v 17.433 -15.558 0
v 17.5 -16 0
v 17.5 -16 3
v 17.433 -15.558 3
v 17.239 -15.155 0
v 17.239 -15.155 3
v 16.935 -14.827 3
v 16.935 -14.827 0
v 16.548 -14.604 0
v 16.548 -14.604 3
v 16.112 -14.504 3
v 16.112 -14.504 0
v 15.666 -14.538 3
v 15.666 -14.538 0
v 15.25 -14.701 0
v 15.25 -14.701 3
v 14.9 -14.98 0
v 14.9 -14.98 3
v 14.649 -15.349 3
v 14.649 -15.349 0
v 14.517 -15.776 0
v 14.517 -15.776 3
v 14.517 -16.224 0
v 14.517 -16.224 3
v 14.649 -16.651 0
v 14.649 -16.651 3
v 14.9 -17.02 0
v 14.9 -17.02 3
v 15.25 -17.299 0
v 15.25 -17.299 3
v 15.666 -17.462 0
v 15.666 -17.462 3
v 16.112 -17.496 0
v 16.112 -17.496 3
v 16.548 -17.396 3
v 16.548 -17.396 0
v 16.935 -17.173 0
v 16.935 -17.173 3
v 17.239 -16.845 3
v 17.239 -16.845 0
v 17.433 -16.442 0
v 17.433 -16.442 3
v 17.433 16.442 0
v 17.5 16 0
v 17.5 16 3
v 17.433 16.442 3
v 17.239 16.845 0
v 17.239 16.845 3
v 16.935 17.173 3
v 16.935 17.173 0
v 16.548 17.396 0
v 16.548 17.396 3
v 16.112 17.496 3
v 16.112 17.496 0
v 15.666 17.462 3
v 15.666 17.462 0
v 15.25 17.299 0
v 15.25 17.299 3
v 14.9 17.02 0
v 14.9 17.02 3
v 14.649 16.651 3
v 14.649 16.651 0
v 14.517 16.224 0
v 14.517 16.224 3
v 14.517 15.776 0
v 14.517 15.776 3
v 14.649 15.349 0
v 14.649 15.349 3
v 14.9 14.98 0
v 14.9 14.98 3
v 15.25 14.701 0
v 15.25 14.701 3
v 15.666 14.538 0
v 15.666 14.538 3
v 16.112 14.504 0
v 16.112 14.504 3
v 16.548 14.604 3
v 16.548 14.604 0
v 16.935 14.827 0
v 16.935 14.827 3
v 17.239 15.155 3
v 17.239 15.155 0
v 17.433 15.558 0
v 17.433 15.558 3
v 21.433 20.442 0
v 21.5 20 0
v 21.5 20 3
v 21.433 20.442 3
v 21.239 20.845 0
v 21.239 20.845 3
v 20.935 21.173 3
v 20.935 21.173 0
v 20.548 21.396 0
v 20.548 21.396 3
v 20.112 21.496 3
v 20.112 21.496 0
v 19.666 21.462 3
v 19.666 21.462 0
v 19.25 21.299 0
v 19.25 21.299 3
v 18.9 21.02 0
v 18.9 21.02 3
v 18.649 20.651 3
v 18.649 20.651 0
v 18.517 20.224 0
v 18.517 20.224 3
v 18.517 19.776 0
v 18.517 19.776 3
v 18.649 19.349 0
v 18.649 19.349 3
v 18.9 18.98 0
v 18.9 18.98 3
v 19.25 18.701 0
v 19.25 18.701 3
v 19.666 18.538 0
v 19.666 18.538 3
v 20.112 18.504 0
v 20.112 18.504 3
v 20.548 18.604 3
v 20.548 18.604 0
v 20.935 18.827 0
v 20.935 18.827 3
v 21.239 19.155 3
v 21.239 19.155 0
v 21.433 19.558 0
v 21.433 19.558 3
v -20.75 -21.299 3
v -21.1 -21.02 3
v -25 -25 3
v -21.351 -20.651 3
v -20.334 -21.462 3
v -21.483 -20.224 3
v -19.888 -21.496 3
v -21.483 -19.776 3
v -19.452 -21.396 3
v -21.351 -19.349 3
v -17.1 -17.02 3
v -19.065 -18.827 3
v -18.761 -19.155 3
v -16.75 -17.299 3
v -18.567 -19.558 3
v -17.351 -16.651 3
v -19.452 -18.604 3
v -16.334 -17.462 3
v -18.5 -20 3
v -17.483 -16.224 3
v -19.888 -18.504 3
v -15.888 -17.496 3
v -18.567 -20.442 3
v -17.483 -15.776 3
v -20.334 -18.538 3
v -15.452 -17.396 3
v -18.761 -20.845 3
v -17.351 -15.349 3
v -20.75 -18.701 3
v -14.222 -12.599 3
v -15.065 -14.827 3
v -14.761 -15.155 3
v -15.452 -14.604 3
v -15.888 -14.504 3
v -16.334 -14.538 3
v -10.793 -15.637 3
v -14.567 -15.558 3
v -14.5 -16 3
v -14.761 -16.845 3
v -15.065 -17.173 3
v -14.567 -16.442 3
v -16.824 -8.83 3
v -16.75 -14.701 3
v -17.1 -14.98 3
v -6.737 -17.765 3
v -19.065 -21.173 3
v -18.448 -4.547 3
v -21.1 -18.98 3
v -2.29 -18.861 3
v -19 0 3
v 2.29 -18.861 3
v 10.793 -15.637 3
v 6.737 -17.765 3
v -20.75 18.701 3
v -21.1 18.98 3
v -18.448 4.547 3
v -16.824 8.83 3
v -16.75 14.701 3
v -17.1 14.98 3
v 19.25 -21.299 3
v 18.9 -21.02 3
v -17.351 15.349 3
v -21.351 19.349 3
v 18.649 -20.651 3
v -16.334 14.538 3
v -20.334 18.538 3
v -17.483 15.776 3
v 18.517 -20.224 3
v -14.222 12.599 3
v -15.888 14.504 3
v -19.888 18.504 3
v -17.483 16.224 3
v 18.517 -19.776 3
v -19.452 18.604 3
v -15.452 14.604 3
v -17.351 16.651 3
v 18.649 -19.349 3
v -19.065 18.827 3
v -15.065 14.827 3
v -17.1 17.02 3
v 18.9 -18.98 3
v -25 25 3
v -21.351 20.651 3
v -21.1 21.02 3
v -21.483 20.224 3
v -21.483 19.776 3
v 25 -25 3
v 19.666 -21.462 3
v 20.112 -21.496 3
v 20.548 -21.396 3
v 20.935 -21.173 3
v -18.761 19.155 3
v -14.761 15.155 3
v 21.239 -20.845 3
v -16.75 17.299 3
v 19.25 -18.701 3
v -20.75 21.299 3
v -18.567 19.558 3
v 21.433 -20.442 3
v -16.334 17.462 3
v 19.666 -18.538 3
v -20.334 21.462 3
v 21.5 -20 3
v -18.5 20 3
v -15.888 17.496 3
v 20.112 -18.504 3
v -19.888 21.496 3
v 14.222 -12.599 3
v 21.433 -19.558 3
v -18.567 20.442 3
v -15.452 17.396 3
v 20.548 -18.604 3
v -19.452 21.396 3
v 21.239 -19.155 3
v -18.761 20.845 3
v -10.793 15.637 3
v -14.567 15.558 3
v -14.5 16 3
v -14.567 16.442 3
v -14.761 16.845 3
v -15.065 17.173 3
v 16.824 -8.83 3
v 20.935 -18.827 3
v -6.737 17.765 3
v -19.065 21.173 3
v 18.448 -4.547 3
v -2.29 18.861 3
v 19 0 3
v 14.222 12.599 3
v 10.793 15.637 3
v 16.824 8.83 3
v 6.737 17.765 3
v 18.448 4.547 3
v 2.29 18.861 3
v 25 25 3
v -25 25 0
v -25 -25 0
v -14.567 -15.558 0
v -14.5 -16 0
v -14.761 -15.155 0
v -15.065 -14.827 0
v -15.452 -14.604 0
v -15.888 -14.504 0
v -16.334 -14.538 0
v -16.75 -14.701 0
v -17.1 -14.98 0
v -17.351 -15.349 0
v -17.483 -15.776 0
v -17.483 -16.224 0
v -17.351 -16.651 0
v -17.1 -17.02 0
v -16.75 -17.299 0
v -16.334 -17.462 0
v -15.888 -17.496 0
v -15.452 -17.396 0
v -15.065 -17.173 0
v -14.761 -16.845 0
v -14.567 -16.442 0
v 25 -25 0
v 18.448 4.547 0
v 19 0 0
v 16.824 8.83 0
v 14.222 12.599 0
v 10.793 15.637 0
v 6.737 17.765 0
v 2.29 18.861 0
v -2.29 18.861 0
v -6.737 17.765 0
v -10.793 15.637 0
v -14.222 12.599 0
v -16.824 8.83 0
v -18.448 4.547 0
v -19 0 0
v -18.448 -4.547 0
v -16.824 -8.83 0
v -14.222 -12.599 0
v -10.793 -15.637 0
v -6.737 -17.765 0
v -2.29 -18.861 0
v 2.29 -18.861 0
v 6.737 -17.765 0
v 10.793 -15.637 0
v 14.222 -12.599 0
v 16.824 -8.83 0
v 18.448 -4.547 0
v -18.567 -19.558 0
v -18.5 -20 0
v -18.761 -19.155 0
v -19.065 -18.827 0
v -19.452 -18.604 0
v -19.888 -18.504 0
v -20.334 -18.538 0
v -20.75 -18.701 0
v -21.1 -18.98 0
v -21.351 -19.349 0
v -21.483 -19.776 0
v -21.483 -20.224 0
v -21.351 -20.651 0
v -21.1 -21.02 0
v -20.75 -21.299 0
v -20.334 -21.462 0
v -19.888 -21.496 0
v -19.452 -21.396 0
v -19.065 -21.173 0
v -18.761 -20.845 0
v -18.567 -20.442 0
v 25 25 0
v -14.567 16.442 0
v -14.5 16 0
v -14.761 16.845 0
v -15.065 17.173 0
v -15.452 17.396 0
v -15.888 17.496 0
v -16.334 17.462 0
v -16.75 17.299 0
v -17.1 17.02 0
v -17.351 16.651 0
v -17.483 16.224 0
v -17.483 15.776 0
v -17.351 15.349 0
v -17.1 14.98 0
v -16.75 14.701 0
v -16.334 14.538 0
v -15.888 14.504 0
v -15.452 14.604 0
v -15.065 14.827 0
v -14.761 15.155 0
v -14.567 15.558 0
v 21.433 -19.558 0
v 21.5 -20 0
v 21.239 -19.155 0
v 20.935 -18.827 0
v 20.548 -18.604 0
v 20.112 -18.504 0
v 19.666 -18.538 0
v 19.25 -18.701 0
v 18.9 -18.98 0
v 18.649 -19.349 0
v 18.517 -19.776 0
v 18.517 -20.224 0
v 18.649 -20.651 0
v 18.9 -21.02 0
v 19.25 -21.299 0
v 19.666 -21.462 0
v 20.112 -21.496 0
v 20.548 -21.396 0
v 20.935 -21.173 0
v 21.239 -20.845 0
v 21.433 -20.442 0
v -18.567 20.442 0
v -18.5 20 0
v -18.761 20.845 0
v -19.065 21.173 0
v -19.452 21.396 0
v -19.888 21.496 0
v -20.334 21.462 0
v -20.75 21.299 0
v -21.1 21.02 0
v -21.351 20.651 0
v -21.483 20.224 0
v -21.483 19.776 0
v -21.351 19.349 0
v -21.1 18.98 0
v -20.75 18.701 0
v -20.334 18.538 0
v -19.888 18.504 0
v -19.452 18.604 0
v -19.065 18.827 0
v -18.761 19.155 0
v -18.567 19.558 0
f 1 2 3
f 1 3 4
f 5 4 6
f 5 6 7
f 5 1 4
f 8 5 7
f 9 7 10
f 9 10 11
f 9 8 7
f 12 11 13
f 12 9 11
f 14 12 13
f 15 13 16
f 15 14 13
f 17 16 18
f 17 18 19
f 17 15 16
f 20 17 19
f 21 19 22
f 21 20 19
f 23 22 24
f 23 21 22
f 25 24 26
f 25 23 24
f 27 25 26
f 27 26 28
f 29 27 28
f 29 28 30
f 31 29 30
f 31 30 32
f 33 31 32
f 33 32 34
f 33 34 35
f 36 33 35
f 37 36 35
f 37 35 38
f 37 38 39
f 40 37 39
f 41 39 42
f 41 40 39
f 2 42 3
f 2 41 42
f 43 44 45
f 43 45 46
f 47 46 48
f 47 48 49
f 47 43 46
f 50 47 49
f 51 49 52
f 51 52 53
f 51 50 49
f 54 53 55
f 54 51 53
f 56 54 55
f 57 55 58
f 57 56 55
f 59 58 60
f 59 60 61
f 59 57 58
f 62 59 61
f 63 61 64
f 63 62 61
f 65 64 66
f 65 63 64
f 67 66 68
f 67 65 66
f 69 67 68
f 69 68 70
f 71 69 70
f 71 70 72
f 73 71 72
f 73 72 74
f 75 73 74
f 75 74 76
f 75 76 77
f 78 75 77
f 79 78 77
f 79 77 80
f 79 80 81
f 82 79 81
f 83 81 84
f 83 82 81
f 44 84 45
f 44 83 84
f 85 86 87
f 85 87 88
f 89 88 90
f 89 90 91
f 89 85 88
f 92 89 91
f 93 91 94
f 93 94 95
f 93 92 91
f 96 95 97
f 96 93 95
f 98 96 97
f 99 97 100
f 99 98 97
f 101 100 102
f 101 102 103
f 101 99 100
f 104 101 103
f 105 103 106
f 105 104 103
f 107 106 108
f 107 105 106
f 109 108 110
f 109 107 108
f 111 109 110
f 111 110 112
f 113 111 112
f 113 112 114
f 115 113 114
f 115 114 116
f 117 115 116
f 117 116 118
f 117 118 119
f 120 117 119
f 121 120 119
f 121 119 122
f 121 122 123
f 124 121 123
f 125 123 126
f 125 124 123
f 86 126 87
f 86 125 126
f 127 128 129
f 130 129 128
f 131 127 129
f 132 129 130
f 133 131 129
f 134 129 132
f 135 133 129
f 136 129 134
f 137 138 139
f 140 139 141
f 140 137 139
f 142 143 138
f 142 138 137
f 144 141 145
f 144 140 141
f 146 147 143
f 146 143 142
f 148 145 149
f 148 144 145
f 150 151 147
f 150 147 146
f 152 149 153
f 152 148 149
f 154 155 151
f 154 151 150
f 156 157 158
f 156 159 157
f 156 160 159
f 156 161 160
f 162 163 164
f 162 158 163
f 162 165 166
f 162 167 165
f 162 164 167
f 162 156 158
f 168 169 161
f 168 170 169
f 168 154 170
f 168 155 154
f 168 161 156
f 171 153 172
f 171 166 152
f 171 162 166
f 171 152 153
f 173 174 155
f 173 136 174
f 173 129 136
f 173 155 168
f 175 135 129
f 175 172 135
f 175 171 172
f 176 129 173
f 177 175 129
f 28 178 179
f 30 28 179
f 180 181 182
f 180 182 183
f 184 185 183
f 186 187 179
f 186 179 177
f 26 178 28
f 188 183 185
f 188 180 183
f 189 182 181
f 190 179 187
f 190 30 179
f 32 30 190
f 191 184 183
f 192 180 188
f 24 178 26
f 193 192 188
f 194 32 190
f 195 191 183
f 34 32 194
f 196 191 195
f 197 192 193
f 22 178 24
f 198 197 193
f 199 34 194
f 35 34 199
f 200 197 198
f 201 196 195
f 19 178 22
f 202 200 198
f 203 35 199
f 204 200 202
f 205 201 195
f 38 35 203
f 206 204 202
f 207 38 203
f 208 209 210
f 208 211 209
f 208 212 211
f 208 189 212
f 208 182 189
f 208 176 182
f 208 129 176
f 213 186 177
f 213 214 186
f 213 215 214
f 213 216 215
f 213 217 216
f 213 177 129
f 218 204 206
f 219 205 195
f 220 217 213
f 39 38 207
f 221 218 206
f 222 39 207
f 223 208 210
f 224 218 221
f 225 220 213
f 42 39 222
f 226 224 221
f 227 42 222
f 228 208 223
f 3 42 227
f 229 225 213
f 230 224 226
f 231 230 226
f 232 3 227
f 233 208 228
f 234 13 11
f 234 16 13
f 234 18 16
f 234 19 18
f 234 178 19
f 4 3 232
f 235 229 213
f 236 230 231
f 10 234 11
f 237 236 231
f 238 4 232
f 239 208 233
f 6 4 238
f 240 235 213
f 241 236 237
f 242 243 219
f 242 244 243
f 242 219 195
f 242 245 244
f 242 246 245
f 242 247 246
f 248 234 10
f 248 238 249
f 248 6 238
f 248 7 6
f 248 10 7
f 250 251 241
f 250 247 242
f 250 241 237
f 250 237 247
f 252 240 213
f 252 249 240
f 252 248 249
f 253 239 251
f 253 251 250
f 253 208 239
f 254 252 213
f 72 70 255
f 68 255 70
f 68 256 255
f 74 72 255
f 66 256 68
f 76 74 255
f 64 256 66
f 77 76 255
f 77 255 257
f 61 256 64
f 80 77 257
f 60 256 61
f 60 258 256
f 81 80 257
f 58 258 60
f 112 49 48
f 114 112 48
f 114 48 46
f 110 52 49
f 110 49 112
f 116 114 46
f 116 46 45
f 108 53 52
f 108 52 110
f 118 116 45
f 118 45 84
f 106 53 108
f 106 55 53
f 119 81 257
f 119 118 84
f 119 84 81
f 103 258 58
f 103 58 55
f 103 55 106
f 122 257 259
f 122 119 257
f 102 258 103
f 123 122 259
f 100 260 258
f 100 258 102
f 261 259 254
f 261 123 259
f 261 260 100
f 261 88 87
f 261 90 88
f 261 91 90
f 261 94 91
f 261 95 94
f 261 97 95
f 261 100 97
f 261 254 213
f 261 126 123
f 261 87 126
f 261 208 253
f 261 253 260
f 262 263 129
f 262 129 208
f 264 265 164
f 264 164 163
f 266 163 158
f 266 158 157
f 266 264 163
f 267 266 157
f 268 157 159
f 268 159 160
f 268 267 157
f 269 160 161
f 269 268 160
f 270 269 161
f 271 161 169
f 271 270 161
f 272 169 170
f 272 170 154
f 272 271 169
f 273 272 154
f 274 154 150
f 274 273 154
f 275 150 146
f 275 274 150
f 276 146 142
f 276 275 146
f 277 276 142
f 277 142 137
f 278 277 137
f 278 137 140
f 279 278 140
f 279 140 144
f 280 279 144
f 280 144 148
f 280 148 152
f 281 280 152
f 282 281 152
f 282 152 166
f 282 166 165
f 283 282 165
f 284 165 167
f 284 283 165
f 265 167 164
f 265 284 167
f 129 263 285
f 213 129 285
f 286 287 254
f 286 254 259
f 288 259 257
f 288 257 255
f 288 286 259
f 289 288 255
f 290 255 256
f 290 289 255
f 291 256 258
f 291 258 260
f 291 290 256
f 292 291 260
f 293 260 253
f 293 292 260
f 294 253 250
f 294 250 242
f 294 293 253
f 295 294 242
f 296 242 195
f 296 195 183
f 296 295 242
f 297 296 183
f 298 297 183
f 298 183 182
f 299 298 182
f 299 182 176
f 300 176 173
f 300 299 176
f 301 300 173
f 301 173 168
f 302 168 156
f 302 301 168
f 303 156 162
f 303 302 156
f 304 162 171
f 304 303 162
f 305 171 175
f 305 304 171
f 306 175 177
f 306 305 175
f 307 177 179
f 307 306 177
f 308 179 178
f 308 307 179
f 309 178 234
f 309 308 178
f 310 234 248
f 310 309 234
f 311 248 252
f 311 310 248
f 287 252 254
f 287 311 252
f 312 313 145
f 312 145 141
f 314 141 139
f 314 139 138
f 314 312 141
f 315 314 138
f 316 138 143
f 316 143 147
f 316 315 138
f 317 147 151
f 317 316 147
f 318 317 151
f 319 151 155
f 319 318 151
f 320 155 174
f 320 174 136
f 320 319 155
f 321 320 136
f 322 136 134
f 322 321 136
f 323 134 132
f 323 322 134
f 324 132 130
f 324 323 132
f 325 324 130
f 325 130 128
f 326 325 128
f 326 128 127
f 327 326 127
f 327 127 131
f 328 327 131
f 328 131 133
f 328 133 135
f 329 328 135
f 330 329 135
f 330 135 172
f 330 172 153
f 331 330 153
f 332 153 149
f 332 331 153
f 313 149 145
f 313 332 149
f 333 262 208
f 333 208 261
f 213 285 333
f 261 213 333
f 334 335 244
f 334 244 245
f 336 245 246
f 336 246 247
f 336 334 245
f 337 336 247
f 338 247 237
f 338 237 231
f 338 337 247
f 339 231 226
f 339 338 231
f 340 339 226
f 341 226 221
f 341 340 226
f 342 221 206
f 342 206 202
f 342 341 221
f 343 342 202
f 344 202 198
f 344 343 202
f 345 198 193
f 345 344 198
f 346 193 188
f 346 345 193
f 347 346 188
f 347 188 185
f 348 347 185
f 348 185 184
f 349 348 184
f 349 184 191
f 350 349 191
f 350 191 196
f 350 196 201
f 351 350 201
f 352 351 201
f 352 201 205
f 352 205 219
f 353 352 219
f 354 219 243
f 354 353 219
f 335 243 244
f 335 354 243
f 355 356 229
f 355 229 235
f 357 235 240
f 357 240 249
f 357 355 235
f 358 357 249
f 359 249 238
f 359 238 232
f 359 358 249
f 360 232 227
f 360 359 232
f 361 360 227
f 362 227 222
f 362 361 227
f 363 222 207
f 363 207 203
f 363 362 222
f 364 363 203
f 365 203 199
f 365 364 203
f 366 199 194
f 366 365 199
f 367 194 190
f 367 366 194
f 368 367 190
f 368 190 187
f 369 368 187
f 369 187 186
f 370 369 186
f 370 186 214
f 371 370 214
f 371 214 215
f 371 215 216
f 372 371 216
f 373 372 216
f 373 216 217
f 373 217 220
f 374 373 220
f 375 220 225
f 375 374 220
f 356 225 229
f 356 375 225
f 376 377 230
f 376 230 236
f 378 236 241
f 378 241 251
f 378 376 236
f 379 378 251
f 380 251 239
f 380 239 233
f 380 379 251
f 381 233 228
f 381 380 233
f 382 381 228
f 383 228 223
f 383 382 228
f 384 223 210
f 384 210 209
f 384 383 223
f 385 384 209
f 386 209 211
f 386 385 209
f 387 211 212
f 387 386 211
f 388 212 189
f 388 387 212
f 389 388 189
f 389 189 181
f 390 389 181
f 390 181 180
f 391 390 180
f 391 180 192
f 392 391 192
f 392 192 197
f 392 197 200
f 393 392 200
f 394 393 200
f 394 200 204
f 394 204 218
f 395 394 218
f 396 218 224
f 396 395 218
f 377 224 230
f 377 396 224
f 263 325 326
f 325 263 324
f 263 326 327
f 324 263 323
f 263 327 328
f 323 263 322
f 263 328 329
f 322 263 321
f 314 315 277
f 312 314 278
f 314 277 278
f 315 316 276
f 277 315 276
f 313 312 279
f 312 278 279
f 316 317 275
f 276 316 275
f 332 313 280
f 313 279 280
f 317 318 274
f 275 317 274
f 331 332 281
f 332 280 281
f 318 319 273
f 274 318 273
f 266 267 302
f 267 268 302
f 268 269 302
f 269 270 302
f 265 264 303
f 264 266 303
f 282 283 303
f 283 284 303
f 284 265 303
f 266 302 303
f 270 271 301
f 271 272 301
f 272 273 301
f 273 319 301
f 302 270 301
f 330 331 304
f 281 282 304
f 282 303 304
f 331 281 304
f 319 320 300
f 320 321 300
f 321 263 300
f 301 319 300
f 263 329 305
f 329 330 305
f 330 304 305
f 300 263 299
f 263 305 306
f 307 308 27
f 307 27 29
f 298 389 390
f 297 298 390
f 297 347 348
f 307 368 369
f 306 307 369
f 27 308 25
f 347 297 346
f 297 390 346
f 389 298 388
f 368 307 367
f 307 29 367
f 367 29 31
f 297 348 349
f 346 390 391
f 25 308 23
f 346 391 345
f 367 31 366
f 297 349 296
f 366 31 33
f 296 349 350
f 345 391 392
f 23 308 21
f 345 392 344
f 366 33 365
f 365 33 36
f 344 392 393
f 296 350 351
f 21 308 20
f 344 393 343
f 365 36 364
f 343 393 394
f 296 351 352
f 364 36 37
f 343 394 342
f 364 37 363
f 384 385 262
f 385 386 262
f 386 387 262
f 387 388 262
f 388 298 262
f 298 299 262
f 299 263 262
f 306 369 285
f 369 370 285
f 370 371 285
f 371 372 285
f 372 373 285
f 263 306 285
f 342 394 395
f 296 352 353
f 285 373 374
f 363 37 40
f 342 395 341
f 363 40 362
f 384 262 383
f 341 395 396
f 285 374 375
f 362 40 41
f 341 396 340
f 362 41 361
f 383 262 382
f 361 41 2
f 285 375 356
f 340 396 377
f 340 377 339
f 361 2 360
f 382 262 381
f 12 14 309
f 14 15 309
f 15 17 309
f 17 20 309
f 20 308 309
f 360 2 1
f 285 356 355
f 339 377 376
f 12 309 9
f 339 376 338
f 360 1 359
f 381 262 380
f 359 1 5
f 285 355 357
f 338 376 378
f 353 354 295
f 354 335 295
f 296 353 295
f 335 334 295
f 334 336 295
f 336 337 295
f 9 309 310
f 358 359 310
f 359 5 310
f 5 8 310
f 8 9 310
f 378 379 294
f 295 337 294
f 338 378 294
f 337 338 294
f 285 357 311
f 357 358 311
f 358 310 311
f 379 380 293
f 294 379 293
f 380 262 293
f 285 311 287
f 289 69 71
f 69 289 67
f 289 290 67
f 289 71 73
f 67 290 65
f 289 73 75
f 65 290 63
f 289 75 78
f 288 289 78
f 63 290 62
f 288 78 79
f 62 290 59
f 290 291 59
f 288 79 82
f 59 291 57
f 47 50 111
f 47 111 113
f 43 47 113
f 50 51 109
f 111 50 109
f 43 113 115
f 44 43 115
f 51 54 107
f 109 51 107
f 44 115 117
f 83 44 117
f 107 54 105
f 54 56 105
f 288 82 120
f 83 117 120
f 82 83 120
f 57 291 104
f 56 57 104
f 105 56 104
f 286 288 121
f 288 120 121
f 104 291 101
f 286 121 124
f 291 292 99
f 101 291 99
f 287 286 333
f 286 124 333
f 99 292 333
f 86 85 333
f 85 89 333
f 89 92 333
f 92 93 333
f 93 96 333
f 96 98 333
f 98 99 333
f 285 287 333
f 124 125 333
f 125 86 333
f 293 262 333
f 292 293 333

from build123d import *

# Parameters (mm, degrees)
F0_W     = 50
F0_H     = 50
F0_R     = 1.5
F0_R_2   = 19
F1_DEPTH = 3


with BuildPart() as f1:
    # F0 (on Top) → F1 (new body)
    with BuildSketch(Plane.XY):
        Rectangle(F0_W, F0_H)
        with Locations((-20, -20)):
            Circle(F0_R, mode=Mode.SUBTRACT)
        with Locations((-16, -16)):
            Circle(F0_R, mode=Mode.SUBTRACT)
        with Locations((20, -20)):
            Circle(F0_R, mode=Mode.SUBTRACT)
        with Locations((16, -16)):
            Circle(F0_R, mode=Mode.SUBTRACT)
        with Locations((-16, 16)):
            Circle(F0_R, mode=Mode.SUBTRACT)
        with Locations((-20, 20)):
            Circle(F0_R, mode=Mode.SUBTRACT)
        Circle(F0_R_2, mode=Mode.SUBTRACT)
        with Locations((16, 16)):
            Circle(F0_R, mode=Mode.SUBTRACT)
        with Locations((20, 20)):
            Circle(F0_R, mode=Mode.SUBTRACT)
    extrude(amount=F1_DEPTH)


solid = f1.part
